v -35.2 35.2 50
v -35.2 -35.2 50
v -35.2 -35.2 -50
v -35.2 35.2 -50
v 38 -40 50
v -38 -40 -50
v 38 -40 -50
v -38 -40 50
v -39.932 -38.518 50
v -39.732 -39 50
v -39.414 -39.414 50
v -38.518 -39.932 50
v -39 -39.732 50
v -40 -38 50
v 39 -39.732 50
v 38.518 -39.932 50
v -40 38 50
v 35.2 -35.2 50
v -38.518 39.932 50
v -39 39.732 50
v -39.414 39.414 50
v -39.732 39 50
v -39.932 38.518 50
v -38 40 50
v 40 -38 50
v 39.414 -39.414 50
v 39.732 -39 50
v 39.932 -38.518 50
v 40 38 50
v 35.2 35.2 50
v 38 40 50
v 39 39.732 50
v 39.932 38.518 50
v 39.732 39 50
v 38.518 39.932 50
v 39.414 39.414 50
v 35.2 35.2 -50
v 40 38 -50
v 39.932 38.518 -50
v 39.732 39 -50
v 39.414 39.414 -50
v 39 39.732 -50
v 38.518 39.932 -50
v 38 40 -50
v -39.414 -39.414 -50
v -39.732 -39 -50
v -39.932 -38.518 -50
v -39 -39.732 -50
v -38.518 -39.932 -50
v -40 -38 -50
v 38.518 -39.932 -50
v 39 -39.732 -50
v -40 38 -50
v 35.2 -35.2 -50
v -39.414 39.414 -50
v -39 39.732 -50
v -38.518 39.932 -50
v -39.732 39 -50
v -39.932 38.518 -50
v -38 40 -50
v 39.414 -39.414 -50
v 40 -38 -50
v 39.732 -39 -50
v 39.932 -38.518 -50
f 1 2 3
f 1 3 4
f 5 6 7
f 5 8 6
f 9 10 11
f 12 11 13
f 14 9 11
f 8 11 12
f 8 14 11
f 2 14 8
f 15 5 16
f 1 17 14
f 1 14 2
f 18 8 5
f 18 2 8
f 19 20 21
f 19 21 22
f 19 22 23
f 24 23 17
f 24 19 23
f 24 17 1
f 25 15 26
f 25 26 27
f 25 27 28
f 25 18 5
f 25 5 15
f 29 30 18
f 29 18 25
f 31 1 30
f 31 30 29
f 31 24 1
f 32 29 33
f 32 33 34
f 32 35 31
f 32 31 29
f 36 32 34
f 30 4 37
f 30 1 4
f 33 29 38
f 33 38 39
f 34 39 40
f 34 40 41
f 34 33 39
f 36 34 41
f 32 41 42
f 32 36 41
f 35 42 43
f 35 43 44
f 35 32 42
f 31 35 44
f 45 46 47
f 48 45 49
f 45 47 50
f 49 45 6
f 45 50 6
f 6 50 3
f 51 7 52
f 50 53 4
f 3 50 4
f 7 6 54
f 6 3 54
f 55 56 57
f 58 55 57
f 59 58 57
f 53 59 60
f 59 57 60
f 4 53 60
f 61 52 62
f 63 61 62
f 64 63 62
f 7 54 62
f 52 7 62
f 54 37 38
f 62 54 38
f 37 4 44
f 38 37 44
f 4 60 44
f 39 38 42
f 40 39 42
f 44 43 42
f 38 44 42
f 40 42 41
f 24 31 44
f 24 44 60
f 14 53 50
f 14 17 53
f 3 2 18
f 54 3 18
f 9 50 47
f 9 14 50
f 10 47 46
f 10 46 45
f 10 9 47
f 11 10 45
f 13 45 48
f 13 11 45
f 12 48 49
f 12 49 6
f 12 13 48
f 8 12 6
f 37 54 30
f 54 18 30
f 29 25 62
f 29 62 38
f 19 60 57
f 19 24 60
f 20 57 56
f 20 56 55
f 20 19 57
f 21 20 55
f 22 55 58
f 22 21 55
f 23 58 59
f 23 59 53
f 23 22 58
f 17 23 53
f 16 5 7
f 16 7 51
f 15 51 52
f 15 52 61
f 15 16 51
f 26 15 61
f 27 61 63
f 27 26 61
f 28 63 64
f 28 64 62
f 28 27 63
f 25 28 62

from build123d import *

# Parameters (mm, degrees)
ESBO_O1_W                = 70.4
ESBO_O1_H                = 70.4
RESSALTO_EXTRUS_O1_DEPTH = 50


with BuildPart() as part:
    # Esboço1 → Ressalto-extrusão1 (new, symmetric)
    with BuildSketch(Plane.XY):
        with BuildLine():
            Line((-38, -40), (38, -40))
            ThreePointArc((38, -40), (39.414213562, -39.414213562), (40, -38))
            Line((40, -38), (40, 38))
            ThreePointArc((40, 38), (39.414213562, 39.414213562), (38, 40))
            Line((38, 40), (-38, 40))
            ThreePointArc((-38, 40), (-39.414213562, 39.414213562), (-40, 38))
            Line((-40, 38), (-40, -38))
            ThreePointArc((-40, -38), (-39.414213562, -39.414213562), (-38, -40))
        make_face()
        Rectangle(ESBO_O1_W, ESBO_O1_H, mode=Mode.SUBTRACT)
    extrude(amount=RESSALTO_EXTRUS_O1_DEPTH, both=True)


solid = part.part
